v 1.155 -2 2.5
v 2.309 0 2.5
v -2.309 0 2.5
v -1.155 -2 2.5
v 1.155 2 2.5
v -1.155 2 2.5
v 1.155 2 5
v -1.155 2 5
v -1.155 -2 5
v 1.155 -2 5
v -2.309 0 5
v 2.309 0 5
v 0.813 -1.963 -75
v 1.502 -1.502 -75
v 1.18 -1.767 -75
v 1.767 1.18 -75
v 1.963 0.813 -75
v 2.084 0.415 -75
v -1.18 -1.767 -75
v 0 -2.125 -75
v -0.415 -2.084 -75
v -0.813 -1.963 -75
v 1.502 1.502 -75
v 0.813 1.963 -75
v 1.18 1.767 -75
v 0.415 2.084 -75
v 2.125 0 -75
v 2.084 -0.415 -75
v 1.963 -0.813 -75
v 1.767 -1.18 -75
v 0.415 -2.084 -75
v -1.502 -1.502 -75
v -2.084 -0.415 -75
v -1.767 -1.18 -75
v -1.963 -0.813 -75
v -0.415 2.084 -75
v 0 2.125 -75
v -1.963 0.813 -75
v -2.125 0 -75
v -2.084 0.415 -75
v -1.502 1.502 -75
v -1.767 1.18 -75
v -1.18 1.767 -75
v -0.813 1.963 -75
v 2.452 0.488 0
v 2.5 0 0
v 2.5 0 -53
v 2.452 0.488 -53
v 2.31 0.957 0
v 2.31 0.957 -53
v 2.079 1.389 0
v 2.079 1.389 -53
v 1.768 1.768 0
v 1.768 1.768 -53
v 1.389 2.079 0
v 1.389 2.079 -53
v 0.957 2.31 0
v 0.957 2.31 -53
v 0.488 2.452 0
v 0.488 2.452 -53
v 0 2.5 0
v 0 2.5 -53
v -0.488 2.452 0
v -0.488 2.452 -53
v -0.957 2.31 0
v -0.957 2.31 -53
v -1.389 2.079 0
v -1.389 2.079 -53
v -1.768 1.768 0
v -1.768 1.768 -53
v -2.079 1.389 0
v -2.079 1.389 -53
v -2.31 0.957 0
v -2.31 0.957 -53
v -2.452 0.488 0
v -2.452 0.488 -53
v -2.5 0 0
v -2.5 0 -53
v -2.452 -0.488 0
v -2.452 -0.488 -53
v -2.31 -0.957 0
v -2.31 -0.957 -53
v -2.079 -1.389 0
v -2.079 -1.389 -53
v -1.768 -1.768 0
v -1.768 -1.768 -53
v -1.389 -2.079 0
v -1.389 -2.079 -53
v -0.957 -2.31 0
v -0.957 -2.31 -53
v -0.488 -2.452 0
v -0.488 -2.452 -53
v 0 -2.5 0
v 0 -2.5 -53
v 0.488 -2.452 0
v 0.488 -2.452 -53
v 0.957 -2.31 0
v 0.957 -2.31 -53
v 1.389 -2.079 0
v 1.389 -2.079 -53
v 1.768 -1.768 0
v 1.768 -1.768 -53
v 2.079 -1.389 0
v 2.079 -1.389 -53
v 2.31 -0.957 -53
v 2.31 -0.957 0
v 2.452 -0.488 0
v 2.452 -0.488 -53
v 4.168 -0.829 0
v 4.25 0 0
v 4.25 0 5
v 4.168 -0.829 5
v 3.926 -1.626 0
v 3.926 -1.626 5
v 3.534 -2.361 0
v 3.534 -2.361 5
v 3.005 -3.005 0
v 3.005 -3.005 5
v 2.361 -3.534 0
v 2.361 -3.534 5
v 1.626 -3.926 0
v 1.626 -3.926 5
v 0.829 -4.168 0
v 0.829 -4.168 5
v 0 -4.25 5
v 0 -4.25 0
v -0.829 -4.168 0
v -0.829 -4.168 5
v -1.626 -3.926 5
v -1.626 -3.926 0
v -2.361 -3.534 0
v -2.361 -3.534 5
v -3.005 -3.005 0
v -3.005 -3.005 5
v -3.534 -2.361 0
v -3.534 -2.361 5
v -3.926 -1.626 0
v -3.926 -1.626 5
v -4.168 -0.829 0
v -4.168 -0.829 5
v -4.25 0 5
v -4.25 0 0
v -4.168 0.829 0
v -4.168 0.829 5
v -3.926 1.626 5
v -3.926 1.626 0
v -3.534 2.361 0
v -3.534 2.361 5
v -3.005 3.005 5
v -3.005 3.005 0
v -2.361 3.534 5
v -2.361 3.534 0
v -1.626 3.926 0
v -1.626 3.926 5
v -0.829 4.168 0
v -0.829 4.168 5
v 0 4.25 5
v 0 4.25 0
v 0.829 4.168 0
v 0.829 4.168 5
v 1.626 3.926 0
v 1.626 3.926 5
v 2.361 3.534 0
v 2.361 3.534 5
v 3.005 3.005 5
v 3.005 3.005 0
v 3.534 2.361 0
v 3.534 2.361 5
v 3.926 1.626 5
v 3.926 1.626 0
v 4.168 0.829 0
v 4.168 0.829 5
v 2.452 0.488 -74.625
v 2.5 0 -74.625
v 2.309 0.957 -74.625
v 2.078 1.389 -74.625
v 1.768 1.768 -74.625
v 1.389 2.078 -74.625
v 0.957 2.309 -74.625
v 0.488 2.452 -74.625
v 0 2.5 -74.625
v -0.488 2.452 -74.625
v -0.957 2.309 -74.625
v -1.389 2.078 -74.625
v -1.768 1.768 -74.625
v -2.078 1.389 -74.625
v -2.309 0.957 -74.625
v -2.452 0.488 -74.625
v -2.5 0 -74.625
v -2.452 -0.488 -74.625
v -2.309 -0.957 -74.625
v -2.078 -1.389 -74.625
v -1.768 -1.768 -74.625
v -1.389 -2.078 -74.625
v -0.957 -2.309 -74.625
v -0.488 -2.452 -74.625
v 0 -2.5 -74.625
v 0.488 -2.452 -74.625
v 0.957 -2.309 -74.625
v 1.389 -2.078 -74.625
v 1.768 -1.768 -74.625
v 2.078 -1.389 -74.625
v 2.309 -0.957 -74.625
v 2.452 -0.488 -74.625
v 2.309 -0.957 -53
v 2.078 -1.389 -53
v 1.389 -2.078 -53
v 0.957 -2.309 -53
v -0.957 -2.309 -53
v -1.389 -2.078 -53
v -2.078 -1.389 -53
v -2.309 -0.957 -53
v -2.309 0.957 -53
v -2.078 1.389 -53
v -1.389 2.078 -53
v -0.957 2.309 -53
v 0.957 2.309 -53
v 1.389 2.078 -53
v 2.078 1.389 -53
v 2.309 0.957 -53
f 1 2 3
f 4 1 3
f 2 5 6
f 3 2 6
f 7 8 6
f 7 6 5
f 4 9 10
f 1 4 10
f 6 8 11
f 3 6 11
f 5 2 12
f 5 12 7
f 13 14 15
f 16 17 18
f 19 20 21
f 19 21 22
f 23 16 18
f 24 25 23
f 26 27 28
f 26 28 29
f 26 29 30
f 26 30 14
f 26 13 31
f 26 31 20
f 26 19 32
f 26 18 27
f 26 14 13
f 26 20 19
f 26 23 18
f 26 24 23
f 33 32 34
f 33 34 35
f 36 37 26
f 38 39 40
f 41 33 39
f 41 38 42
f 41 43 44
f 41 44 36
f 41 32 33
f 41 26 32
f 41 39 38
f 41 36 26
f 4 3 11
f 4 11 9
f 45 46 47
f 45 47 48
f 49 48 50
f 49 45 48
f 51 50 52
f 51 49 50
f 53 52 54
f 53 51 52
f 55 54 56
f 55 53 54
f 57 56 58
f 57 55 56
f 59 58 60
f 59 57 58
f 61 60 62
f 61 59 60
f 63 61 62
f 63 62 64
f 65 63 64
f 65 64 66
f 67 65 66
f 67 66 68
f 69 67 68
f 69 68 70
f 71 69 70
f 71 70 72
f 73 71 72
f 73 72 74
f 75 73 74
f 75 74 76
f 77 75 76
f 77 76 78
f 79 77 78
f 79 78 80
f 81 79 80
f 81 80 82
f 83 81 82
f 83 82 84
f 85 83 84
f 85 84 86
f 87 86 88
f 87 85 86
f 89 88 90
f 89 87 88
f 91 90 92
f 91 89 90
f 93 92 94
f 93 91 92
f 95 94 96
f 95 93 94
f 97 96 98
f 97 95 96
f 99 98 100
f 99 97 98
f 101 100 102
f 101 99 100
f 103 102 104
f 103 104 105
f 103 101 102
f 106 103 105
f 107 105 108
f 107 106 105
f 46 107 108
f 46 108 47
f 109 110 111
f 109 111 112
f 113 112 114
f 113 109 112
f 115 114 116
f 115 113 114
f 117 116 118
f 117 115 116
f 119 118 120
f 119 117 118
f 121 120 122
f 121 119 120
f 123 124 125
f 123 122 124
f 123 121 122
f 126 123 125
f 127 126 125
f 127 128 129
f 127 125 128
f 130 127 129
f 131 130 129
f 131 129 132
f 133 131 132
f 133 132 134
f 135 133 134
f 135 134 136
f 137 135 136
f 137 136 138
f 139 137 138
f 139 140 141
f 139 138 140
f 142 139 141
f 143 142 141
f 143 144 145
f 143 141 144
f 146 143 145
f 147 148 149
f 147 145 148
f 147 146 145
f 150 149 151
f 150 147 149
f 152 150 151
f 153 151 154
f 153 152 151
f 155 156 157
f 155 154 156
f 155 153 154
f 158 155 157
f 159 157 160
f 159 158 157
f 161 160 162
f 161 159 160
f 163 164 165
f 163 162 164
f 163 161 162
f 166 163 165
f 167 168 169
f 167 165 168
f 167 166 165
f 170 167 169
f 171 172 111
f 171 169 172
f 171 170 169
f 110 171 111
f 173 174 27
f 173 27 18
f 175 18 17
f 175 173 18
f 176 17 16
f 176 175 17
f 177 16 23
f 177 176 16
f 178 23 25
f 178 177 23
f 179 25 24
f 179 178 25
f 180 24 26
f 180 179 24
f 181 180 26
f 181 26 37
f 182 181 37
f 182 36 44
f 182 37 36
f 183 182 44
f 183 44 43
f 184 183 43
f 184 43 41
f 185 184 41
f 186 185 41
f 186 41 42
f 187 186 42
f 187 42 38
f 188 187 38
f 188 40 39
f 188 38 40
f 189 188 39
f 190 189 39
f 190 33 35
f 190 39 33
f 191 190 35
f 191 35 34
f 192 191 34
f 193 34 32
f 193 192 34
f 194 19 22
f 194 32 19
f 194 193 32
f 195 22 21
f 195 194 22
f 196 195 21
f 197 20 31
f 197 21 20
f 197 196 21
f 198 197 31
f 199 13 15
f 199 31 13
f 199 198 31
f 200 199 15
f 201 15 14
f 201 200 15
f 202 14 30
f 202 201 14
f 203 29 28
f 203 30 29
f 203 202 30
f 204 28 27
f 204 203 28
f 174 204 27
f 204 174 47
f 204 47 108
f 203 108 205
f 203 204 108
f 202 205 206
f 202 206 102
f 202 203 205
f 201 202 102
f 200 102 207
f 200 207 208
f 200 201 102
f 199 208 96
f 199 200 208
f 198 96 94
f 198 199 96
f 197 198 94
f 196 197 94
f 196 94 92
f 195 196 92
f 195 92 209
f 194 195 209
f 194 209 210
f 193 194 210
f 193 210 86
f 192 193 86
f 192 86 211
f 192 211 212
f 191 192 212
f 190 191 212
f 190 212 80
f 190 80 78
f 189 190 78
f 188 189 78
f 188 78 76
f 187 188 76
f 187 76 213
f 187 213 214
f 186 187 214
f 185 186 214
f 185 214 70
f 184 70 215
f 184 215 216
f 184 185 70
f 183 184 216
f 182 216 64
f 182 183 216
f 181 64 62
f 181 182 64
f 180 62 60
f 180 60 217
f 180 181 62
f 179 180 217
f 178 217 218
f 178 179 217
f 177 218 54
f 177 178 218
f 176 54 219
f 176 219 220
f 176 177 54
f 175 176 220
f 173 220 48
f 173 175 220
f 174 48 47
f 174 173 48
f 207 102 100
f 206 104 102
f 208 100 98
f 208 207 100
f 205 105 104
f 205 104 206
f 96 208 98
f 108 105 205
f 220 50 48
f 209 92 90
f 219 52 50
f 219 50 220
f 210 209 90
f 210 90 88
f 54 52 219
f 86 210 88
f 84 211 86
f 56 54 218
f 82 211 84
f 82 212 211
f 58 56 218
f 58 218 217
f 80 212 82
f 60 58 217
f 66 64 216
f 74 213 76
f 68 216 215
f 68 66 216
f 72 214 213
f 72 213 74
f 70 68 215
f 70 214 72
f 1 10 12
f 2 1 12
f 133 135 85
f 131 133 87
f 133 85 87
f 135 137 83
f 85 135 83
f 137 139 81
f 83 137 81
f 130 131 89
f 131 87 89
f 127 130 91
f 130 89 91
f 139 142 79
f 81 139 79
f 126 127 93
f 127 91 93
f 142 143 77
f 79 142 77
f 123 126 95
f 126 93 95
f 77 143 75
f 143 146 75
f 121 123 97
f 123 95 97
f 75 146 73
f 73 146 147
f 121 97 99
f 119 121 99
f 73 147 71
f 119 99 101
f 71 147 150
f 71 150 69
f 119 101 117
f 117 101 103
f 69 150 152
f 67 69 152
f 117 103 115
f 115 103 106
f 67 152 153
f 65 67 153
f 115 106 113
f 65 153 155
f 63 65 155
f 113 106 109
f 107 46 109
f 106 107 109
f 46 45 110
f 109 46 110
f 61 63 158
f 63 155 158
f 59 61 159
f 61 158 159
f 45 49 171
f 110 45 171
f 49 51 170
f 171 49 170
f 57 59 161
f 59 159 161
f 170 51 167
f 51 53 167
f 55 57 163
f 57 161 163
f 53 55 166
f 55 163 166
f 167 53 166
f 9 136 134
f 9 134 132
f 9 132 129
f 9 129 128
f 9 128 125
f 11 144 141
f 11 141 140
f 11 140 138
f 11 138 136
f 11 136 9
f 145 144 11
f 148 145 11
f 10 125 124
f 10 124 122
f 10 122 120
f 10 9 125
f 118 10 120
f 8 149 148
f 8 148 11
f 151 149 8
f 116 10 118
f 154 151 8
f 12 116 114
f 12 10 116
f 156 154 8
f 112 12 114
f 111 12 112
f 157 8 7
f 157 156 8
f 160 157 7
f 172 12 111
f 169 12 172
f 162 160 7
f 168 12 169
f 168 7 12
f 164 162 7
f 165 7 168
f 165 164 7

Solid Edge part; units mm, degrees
sketch "Sketch1" plane through (0, 0, 0) normal (0, 0, 1) x (1, 0, 0)
  circle A0 centre (0, 0) radius 4.25
  dimension "D1" = 8.5
extrude "Protrusion1" add sketch "Sketch1" along normal blind 5
sketch "Sketch2" plane through (0, 0, 0) normal (0, 0, -1) x (1, 0, 0)
  circle A0 centre (0, 0) radius 2.5
extrude "Protrusion2" add sketch "Sketch2" along normal blind 75
sketch "Sketch3" plane through (0, 0, -75) normal (0, 0, -1) x (1, 0, 0)
  circle A0 centre (0, 0) radius 2.4997
extrude "Cutout1" cut sketch "Sketch3" against normal blind 22 flip side to cut
chamfer "Chamfer_1" distance 0.375 angle 45 1 edges at (-2.4997, 0, -75)
sketch "Sketch4" plane through (0, 0, 5) normal (0, 0, 1) x (1, 0, 0)
  line L0 (-1.1547, 2) -> (1.1547, 2)
  line L1 (2.3094, 0) -> (1.1547, 2)
  line L2 (1.1547, -2) -> (2.3094, 0)
  line L3 (-1.1547, -2) -> (1.1547, -2)
  line L4 (-2.3094, 0) -> (-1.1547, -2)
  line L5 (-1.1547, 2) -> (-2.3094, 0)
  dimension "D1" = 4
extrude "Cutout2" cut sketch "Sketch4" against normal blind 2.5
properties part number "185705" material "Stainless Steel, 304"
